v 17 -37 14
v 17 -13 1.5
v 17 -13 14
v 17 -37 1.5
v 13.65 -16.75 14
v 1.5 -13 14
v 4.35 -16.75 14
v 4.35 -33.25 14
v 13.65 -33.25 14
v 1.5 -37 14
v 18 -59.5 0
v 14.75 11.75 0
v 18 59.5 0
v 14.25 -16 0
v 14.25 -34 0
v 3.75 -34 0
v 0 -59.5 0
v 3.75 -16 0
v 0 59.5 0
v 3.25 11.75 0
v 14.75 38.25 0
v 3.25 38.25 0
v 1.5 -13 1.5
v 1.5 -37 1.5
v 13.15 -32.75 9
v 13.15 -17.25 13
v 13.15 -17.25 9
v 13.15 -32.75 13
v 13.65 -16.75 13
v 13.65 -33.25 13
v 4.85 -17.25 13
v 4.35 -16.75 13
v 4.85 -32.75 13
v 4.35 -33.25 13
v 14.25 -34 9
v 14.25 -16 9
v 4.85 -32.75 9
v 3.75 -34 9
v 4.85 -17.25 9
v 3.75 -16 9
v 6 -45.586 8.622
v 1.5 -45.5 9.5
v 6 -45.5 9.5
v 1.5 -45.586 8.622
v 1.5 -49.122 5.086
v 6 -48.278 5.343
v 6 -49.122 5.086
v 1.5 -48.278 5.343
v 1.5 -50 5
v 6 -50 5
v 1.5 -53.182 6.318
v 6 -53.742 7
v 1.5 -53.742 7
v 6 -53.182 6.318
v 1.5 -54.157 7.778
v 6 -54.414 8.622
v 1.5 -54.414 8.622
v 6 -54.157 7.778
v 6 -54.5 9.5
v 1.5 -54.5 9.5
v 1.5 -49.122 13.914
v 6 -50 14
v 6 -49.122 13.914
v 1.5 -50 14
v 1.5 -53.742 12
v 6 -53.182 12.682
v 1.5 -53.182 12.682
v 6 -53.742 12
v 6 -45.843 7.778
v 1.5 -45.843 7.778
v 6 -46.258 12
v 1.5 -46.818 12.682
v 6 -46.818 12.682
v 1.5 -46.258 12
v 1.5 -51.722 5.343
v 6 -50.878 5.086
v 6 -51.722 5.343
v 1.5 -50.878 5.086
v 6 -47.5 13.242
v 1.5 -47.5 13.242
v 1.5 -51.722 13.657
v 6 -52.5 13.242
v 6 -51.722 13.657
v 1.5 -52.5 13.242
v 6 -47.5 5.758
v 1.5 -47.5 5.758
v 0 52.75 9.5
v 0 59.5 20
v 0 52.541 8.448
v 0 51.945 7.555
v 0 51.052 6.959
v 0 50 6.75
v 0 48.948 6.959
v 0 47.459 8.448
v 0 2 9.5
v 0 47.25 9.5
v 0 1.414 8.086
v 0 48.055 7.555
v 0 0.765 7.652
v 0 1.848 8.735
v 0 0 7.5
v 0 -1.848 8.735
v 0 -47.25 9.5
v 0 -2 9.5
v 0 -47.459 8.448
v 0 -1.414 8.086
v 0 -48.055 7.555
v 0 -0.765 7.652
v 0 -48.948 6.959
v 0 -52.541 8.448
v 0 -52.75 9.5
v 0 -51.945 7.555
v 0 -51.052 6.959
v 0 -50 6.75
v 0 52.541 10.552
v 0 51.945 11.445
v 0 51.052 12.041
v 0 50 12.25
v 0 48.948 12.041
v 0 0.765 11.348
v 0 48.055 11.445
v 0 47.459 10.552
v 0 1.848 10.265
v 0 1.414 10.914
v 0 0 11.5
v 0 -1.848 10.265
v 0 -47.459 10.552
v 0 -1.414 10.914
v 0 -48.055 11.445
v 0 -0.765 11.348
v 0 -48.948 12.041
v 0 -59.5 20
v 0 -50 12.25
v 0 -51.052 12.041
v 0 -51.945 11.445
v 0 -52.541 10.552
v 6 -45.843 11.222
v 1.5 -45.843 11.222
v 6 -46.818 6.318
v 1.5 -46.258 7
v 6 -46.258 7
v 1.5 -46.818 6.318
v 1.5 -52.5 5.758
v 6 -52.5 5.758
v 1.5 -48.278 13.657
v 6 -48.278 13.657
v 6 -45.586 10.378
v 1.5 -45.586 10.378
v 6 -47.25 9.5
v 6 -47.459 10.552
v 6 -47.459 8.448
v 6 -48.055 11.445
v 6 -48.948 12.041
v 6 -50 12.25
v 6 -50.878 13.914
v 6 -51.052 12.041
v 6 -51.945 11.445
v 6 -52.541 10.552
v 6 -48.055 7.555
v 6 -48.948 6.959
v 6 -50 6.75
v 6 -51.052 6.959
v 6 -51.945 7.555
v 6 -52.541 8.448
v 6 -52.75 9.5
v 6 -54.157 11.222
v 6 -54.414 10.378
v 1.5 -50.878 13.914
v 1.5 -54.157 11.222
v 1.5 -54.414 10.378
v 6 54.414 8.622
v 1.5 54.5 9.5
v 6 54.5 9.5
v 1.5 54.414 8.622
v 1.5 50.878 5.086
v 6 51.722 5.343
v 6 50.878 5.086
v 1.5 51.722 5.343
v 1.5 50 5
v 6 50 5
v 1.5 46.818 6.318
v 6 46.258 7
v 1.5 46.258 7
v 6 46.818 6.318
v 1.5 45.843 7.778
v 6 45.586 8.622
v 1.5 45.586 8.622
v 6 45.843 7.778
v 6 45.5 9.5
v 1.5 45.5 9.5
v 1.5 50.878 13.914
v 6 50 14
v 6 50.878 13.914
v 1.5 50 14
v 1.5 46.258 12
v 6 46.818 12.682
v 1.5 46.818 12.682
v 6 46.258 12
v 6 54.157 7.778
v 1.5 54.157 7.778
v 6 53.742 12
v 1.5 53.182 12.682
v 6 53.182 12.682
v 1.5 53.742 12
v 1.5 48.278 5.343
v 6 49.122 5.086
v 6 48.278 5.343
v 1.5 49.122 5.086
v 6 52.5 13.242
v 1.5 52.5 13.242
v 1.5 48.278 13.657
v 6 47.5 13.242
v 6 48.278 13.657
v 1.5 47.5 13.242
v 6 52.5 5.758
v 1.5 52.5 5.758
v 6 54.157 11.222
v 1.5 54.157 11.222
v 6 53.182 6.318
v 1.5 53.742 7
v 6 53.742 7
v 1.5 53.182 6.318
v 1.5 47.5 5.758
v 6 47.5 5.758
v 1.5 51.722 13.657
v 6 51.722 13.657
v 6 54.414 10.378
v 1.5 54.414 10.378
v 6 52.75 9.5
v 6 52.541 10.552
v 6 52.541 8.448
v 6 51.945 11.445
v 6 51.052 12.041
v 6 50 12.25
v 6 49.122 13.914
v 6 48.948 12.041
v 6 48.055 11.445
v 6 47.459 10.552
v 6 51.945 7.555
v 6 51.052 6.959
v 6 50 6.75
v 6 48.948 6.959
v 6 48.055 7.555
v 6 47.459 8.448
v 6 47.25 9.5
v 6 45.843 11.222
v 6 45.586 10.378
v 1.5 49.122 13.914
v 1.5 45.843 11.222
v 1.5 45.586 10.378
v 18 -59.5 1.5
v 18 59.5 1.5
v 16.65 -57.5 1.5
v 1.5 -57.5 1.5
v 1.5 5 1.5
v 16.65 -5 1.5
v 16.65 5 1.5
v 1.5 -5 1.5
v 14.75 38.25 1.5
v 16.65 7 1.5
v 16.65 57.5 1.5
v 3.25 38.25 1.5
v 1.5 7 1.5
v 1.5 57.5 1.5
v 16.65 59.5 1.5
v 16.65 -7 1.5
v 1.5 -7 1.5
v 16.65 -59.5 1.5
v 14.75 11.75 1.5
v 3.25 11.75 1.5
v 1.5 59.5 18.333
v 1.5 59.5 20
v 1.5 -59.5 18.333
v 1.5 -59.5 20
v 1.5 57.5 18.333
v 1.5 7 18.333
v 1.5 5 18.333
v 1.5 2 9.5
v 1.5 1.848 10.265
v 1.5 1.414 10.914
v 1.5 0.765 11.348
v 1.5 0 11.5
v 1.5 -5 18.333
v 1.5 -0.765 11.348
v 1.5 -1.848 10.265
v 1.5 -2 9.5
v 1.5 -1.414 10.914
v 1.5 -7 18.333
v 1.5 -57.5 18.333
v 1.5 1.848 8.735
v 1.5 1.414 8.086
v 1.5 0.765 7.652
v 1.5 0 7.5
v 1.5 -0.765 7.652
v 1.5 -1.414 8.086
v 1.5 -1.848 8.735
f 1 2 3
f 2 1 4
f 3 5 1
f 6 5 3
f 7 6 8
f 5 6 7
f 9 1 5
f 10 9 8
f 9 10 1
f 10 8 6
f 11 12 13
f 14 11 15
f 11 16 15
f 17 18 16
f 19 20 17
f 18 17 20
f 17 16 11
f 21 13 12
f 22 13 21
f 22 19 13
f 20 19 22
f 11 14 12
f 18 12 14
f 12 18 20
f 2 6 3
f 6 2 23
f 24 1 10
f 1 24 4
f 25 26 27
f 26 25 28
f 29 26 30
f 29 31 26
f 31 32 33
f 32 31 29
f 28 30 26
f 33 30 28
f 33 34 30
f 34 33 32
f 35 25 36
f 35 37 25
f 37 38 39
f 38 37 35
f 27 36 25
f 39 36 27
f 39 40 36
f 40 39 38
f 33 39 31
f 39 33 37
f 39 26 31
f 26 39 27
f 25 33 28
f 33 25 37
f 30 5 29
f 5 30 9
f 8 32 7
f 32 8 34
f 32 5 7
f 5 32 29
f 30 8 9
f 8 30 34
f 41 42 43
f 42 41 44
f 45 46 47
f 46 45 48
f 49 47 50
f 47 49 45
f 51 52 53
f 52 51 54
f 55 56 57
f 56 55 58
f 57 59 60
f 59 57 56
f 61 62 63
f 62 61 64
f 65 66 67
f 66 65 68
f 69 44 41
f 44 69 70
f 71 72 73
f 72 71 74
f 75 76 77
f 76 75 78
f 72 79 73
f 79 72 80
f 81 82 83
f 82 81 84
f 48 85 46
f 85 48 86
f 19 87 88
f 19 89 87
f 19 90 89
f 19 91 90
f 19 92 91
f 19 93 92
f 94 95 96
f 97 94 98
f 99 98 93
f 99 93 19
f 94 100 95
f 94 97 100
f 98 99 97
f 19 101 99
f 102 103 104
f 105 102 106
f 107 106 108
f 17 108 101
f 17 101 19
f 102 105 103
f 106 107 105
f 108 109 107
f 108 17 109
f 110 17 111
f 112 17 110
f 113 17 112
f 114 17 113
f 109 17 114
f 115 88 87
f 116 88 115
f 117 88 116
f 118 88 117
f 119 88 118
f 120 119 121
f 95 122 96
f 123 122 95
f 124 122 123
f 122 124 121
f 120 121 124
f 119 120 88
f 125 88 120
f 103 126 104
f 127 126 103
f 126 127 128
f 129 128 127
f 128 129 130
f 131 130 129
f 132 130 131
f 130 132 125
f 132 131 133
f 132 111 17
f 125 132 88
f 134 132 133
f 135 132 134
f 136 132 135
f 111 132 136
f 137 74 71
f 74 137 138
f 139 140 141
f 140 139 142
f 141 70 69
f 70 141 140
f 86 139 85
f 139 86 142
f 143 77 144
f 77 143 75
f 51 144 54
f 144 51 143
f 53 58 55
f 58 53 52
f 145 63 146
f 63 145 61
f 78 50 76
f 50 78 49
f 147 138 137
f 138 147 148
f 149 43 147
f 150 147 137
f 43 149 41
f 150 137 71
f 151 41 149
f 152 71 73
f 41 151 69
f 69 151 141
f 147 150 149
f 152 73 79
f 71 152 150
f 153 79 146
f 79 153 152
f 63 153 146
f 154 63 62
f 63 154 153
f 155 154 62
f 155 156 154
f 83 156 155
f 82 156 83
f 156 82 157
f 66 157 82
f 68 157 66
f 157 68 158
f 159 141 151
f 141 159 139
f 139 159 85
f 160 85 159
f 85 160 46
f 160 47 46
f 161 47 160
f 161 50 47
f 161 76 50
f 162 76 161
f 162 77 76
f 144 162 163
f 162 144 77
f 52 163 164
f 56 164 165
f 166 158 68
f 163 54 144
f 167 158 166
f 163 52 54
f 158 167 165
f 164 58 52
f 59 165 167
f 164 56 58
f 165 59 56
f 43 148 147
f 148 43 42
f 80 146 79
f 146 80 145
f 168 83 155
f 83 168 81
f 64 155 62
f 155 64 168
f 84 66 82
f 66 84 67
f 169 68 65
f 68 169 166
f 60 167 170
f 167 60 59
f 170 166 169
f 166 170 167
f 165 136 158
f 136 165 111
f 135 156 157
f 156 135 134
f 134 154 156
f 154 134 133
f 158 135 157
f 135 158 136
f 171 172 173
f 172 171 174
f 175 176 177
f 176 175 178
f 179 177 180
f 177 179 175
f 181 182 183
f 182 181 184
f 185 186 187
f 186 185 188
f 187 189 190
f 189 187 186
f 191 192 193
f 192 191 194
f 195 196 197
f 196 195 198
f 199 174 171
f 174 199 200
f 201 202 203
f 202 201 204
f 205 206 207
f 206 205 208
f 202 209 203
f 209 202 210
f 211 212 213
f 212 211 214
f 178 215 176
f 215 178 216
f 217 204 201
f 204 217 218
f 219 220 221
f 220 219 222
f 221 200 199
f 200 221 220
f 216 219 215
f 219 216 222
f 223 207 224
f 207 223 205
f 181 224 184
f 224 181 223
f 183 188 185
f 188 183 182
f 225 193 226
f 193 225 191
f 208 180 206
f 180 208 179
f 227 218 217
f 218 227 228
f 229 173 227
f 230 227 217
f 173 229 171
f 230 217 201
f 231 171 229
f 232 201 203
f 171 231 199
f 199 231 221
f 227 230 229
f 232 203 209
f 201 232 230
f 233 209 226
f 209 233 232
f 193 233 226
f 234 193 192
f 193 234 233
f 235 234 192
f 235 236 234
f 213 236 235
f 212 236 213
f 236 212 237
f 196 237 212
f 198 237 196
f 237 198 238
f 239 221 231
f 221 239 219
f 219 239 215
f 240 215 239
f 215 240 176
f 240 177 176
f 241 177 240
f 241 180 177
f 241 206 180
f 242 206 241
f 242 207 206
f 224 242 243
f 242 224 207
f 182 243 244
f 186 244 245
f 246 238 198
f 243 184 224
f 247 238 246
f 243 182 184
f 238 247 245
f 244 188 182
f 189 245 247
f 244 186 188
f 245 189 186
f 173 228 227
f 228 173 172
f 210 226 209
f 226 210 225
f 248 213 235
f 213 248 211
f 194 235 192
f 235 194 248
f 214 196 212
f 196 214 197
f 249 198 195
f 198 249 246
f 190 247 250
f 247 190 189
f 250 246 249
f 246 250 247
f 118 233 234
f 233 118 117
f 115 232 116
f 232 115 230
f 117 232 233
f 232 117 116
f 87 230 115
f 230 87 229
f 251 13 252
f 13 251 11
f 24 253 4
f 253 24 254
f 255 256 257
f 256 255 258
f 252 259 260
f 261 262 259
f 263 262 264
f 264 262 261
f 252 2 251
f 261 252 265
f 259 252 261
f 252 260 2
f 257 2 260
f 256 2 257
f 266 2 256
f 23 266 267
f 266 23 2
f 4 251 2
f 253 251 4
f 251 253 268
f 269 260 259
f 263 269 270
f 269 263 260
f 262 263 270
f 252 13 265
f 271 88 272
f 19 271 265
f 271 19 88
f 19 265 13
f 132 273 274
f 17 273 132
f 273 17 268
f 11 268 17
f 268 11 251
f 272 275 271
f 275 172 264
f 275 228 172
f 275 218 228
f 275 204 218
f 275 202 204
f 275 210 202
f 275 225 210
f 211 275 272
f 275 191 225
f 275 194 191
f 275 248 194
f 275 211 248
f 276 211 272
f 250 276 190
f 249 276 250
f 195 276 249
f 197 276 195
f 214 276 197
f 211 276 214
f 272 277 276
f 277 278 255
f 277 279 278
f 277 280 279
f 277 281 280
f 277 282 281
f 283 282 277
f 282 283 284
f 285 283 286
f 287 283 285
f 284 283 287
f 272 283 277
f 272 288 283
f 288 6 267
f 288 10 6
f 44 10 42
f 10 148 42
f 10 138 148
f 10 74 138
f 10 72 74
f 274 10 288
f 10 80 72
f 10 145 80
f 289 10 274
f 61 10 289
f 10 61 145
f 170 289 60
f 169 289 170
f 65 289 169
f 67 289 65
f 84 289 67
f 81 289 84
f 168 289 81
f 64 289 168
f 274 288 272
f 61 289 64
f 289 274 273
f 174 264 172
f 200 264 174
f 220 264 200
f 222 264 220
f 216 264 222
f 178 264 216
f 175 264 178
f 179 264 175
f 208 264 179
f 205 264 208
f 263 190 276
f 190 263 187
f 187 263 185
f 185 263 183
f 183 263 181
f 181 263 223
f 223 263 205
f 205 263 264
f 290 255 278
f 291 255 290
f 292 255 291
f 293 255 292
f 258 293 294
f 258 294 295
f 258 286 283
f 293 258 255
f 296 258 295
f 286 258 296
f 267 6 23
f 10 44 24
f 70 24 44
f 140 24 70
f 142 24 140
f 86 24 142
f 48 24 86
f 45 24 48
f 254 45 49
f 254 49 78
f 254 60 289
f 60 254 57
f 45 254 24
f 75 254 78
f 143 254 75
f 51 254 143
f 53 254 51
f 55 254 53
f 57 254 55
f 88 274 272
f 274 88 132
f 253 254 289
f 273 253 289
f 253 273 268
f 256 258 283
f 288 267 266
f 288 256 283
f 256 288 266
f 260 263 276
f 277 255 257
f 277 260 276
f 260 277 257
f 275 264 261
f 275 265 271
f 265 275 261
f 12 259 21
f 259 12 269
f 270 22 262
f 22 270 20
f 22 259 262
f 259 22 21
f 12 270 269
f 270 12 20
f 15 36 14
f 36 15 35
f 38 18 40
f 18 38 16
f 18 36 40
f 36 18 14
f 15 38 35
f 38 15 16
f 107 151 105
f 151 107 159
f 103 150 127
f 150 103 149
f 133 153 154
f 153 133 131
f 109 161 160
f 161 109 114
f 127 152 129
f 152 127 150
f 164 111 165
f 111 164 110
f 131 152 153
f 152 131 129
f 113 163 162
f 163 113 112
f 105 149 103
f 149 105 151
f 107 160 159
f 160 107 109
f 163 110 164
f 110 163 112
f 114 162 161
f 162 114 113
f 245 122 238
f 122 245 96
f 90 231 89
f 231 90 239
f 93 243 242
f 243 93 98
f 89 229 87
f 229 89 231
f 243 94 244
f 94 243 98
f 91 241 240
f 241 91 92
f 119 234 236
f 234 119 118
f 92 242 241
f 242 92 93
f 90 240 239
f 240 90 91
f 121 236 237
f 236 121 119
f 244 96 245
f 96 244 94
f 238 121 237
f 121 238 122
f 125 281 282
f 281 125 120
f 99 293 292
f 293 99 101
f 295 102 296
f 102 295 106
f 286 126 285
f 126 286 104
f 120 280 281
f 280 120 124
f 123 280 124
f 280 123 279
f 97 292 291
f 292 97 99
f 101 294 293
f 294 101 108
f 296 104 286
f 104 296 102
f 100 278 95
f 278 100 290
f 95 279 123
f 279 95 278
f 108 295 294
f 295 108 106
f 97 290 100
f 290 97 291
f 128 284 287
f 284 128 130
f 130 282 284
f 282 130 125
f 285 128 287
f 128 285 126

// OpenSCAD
difference() {
    union() {
    translate([0,-119/2,0])
    cube([18,119,1.5]);
        
        
translate([0,-119/2,0])
cube([1.5,119,20]);
    
    translate([9,-25,0])
    chargeportplus();
    
    translate([0,-119/2+1,0])
    support();
        
    translate([0,-6,0])
    support();
        
    translate([0,6,0])
    support();
        
    translate([0,119/2-1,0])
    support();
        
        
translate([0,-50,9.5])
rotate([0,90,0])
standoffplus();
translate([0,50,9.5])
rotate([0,90,0])
standoffplus();

    }
    
    translate([9,25,0])
    switchminus();
    
    translate([9,-25,0])
    chargeportminus();
    
    translate([0,-50,9.5])
rotate([0,90,0])
standoffminus();
translate([0,50,9.5])
rotate([0,90,0])
standoffminus();

translate([0,0,9.5])
rotate([0,90,0])
hole();

}



module standoffplus() {
    difference() {
    cylinder(d=9,h=6,$fn=32);
    cylinder(d=5.5,h=6,$fn=16);
    }
}

module standoffminus() {
    cylinder(d=5.5,h=6,$fn=16);
}

module switchminus() {
    translate([-11.5/2,-26.5/2])
    cube([11.5,26.5,5]);
}

module chargeportminus() {
    translate([-10.5/2,-18/2,0])
    cube([10.5,18,9]);
}

module support() {
rotate([90,0,0])
linear_extrude(height = 2, center = true, convexity = 10, twist = 0)
polygon(points=[[0,0],[18,0],[0,20]]);
}

module chargeportplus() {
    difference() {
        translate([-16/2,-24/2,0])
        cube([16,24,14]);
        
        translate([0,0,9])
        translate([-8.3/2,-15.5/2,0])
        cube([8.3,15.5,4]);
        
        translate([0,0,13])
        translate([-9.3/2,-16.5/2,0])
        cube([9.3,16.5,9]);
    }
}

module hole() {
    cylinder(d=4,h=5,$fn=16);
}
